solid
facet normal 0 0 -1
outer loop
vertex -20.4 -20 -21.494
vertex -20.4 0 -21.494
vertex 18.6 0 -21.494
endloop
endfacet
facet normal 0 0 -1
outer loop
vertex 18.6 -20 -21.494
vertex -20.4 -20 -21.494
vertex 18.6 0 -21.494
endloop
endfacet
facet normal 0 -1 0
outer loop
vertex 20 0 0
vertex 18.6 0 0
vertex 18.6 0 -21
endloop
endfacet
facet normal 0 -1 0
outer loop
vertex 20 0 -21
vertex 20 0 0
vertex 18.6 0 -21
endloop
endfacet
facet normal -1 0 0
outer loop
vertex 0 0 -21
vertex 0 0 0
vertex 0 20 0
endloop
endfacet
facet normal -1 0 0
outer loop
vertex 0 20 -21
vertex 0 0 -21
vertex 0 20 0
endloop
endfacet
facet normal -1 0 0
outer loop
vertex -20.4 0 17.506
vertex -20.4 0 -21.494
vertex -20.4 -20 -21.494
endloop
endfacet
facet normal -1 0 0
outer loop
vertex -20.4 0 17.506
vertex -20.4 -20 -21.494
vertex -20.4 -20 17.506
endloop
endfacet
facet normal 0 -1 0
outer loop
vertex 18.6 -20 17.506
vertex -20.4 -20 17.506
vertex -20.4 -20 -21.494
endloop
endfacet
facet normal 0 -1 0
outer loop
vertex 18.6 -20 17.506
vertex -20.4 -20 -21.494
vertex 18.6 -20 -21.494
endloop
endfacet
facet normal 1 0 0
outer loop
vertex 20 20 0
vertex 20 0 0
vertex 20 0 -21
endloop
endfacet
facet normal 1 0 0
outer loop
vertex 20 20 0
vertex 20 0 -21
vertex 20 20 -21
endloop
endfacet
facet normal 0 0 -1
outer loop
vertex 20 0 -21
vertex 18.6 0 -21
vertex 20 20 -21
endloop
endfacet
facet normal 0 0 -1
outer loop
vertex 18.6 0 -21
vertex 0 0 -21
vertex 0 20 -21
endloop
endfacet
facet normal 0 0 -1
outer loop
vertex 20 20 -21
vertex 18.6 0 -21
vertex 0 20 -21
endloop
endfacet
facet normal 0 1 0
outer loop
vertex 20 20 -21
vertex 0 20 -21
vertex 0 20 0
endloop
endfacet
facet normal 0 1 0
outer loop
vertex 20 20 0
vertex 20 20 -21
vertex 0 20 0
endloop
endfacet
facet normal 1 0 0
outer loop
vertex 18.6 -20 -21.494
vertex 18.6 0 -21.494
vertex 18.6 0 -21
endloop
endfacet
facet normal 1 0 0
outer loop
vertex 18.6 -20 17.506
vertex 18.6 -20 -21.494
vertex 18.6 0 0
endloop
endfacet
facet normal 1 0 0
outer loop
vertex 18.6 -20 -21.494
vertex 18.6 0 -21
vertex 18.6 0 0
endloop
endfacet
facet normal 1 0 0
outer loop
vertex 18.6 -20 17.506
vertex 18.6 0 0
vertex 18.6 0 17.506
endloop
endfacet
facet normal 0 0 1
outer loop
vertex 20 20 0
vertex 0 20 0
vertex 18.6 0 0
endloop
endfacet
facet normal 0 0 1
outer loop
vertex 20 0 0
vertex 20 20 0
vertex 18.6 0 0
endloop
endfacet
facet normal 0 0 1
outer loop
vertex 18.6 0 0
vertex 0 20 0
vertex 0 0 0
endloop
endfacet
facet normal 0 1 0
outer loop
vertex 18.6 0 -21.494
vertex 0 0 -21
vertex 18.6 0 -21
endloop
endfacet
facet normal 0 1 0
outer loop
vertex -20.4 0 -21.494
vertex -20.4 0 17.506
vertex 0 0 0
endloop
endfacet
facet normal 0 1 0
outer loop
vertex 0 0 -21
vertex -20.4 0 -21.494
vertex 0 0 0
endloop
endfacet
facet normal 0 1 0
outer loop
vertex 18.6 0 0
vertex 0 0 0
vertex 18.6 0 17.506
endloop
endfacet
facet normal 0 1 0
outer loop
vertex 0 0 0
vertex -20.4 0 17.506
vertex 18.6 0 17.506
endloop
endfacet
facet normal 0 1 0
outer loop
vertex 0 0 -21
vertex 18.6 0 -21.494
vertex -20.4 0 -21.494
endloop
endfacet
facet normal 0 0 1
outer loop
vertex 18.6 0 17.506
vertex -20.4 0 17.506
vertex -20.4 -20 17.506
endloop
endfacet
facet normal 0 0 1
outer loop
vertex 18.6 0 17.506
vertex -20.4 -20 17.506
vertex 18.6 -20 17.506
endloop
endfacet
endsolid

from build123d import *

# Parameters (mm, degrees)
F0_W     = 39
F0_H     = 39
F1_DEPTH = 20
F3_DEPTH = 20


with BuildPart() as f1:
    # F0 (on Front) → F1 (new body)
    with BuildSketch(Plane.XZ):
        with Locations((-0.900001, -1.994445)):
            Rectangle(F0_W, F0_H)
    extrude(amount=F1_DEPTH)

    # F2 (on Right) → F3 (join)
    with BuildSketch(Plane.YZ):
        Polygon((20, 0), (0, 0), (0, -18.648019), (0, -21), (20, -21), align=None)
    extrude(amount=F3_DEPTH)


solid = f1.part
